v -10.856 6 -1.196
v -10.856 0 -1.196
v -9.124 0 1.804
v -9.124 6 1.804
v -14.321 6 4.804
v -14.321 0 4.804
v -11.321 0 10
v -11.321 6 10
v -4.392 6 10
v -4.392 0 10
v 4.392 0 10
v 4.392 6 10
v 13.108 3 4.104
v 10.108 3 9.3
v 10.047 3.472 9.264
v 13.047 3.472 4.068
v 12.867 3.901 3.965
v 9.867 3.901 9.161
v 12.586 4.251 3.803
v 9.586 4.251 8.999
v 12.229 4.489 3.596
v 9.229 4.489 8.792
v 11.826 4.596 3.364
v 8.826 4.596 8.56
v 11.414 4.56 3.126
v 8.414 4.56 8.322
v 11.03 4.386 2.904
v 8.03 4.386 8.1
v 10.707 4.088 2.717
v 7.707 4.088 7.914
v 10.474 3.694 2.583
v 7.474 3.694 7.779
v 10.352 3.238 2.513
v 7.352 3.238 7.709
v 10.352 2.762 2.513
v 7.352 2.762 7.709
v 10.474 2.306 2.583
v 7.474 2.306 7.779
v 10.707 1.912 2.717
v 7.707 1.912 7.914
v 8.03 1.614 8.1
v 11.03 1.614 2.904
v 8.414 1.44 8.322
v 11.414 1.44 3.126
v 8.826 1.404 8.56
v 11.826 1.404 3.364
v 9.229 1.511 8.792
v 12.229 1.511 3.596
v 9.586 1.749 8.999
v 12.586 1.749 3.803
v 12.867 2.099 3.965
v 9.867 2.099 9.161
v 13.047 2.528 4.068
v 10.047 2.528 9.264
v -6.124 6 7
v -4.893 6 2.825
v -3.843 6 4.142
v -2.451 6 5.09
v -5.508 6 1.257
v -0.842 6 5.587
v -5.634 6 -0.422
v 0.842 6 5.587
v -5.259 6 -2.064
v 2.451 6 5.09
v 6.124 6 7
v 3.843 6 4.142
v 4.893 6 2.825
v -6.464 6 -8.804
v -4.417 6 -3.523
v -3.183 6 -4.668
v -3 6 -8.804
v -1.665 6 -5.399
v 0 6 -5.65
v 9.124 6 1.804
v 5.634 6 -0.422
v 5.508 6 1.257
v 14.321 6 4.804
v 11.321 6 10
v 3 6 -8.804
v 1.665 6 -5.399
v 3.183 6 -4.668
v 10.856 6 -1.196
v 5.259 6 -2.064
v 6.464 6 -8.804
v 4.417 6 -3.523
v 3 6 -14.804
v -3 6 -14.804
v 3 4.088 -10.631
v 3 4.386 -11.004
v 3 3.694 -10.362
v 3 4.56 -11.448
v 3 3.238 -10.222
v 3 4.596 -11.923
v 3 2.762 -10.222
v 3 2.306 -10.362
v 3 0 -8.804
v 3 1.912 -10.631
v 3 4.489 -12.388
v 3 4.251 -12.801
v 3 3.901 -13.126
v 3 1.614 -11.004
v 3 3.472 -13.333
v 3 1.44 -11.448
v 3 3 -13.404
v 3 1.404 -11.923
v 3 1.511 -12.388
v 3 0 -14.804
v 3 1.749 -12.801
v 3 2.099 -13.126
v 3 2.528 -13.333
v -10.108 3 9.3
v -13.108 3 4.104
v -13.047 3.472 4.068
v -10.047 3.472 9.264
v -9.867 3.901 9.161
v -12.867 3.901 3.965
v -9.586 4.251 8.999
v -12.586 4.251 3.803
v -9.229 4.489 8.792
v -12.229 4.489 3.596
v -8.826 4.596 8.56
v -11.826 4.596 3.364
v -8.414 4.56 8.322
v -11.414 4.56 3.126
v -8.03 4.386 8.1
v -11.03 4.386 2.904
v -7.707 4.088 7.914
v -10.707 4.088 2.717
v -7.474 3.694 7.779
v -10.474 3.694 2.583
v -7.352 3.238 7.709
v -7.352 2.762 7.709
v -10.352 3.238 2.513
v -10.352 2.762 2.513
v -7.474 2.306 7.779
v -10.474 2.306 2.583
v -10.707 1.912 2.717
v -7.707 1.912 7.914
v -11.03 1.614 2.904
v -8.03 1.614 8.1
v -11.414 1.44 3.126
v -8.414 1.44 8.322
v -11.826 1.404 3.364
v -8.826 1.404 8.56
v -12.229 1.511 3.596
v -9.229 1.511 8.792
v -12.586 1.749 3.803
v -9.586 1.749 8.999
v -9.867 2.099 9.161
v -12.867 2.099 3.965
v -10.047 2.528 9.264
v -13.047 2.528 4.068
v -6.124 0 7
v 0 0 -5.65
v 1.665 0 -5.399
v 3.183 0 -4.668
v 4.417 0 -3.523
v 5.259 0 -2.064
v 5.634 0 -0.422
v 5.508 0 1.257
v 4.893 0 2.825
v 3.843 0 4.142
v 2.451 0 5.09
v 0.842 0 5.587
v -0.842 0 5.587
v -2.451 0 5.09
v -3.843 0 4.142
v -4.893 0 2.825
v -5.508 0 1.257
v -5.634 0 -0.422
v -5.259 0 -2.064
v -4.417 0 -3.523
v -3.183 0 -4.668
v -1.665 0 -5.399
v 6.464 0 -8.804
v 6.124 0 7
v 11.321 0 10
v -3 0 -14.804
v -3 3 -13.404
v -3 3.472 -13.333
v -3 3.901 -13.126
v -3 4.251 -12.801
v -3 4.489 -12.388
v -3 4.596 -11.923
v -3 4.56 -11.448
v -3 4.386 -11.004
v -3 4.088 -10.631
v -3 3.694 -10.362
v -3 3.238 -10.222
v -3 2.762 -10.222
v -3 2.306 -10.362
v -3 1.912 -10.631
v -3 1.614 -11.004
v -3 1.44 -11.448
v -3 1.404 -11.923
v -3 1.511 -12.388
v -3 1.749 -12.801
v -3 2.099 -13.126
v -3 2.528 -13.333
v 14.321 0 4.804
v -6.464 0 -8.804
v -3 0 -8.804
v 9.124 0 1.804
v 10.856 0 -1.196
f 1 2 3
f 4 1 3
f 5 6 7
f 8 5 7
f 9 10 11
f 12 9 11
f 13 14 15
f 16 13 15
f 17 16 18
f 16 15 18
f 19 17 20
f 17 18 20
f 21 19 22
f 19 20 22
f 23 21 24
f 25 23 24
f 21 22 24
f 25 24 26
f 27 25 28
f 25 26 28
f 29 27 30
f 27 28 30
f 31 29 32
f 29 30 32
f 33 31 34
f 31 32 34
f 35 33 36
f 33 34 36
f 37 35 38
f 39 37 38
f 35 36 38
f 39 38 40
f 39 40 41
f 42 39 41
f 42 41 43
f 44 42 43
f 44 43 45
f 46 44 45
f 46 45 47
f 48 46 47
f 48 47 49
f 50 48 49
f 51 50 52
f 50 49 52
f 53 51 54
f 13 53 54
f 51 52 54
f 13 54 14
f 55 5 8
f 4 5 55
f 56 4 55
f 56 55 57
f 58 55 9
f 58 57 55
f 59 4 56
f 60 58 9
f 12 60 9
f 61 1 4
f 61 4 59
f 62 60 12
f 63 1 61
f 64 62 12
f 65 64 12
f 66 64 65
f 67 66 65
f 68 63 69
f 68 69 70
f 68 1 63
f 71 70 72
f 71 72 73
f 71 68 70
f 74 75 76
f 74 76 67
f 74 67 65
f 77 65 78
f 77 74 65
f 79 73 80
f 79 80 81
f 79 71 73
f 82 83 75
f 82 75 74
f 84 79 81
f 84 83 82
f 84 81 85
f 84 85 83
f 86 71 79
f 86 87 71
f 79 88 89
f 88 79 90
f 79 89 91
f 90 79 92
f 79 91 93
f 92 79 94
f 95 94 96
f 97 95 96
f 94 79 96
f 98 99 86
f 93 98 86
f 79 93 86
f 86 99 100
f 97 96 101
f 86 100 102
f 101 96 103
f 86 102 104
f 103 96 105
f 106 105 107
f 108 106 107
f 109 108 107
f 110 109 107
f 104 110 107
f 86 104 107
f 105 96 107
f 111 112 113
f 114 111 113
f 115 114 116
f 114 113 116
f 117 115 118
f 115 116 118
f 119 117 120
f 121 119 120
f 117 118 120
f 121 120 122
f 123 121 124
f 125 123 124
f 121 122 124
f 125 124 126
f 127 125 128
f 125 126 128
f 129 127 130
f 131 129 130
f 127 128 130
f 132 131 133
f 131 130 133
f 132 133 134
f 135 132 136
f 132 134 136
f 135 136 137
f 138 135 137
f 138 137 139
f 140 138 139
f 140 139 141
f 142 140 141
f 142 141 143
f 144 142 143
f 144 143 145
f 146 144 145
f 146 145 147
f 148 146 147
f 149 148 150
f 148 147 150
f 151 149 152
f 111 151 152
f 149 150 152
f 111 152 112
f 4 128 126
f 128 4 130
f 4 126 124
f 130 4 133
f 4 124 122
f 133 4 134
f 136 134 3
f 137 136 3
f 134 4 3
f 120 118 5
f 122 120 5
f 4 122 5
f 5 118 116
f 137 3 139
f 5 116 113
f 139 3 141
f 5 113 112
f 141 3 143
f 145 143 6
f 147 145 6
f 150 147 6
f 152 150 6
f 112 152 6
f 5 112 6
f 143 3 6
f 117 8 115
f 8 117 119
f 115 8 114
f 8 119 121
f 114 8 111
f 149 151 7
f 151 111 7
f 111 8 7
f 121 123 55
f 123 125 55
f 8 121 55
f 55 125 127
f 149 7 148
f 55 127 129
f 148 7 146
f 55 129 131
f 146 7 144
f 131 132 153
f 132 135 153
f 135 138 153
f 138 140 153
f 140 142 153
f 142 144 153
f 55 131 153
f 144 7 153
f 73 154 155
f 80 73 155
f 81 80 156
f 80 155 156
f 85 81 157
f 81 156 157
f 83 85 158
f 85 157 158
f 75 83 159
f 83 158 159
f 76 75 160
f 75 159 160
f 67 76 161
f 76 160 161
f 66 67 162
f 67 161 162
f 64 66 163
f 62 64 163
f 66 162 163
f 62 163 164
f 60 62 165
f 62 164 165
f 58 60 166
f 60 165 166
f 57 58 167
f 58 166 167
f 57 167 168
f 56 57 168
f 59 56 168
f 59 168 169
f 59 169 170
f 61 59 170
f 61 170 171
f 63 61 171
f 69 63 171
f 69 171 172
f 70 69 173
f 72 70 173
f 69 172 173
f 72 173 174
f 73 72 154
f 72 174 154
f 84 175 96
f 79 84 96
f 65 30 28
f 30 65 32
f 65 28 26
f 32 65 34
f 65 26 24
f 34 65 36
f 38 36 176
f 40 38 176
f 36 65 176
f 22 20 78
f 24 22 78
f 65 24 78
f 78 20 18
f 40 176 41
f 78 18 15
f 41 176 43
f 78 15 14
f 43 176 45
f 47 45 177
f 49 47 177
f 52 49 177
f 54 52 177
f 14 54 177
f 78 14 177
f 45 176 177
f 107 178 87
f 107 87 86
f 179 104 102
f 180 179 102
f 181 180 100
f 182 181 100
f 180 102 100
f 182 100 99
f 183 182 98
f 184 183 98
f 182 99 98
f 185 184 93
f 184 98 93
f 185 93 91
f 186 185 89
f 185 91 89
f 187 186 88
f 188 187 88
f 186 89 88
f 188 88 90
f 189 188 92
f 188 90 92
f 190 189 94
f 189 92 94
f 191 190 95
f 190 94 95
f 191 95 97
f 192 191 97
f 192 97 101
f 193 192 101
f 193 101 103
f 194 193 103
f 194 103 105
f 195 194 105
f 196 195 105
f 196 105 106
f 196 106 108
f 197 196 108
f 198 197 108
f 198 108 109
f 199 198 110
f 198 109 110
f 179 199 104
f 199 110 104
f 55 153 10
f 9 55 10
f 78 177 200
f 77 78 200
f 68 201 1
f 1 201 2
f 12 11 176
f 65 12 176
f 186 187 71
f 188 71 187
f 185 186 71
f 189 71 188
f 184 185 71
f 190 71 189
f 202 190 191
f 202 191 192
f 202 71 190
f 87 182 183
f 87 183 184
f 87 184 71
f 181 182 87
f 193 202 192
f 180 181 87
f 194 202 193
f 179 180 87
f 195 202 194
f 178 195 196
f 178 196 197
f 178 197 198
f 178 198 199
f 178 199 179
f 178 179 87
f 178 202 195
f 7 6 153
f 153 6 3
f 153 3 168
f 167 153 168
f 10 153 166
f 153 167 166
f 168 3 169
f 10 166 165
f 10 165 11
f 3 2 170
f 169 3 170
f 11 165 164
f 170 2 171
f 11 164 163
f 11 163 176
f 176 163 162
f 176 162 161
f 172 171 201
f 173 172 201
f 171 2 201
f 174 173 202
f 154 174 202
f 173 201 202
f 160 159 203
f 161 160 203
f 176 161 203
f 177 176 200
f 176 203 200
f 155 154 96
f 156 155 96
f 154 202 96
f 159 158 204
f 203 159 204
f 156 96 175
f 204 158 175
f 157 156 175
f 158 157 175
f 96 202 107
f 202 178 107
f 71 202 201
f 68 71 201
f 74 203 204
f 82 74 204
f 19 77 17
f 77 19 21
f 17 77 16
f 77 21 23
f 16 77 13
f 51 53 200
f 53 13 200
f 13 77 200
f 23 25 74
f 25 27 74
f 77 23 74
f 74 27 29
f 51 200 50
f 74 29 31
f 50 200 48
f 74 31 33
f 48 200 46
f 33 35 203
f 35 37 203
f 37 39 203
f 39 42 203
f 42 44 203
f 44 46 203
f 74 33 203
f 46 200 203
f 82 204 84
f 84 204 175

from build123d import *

# Parameters (mm, degrees)
SKETCH_1_W          = 6
SKETCH_1_H          = 6
EXTRUDE_2_DEPTH     = 6
SKETCH_6_R          = 1.6
CUT_EXTRUDE_5_DEPTH = 6
SKETCH_7_R          = 1.6
CUT_EXTRUDE_6_DEPTH = 6
SKETCH_8_R          = 1.6
CUT_EXTRUDE_7_DEPTH = 6
SKETCH_9_R          = 5.65
CUT_EXTRUDE_9_DEPTH = 6


with BuildPart() as part:
    # 草图1 → 凸台-拉伸2 (new body)
    with BuildSketch(Plane(origin=(0, 0, 0), x_dir=(1, 0, 0), z_dir=(0, 1, 0))):
        Polygon((-3, 8.803847577), (-6.464101615, 8.803847577), (-10.856406461, 1.196152423), (-9.124355653, -1.803847577), (-6.124355653, -7), (-4.392304845, -10), (4.392304845, -10), (6.124355653, -7), (9.124355653, -1.803847577), (10.856406461, 1.196152423), (6.464101615, 8.803847577), (3, 8.803847577), align=None)
        Polygon((-9.124355653, -1.803847577), (-14.320508076, -4.803847577), (-11.320508076, -10), (-6.124355653, -7), align=None)
        Polygon((11.320508076, -10), (14.320508076, -4.803847577), (9.124355653, -1.803847577), (6.124355653, -7), align=None)
        with Locations((0, 11.803847577)):
            Rectangle(SKETCH_1_W, SKETCH_1_H)
    extrude(amount=EXTRUDE_2_DEPTH)

    # 草图6 → 切除-拉伸5 (cut)
    with BuildSketch(Plane(origin=(-1.5, 0, -2.598076211), x_dir=(-0.8660254037844386, 0, 0.5000000000000001), z_dir=(-0.5000000000000001, 0, -0.8660254037844386))):
        with Locations((11.803847577, 3)):
            Circle(SKETCH_6_R)
    extrude(amount=-CUT_EXTRUDE_5_DEPTH, mode=Mode.SUBTRACT)

    # 草图7 → 切除-拉伸6 (cut)
    with BuildSketch(Plane(origin=(3, 0, 0), x_dir=(0, 0, -1), z_dir=(1, 0, 0))):
        with Locations((11.803847577, 3)):
            Circle(SKETCH_7_R)
    extrude(amount=-CUT_EXTRUDE_6_DEPTH, mode=Mode.SUBTRACT)

    # 草图8 → 切除-拉伸7 (cut)
    with BuildSketch(Plane(origin=(-1.5, 0, 2.598076211), x_dir=(0.8660254037844387, 0, 0.49999999999999983), z_dir=(-0.49999999999999983, 0, 0.8660254037844387))):
        with Locations((11.803847577, 3)):
            Circle(SKETCH_8_R)
    extrude(amount=-CUT_EXTRUDE_7_DEPTH, mode=Mode.SUBTRACT)

    # 草图9 → 切除-拉伸9 (cut)
    with BuildSketch(Plane.XZ):
        with Locations(Location((0, 0, 0), (0, 0, 270))):
            Circle(SKETCH_9_R)
    extrude(amount=-CUT_EXTRUDE_9_DEPTH, mode=Mode.SUBTRACT)


solid = part.part
